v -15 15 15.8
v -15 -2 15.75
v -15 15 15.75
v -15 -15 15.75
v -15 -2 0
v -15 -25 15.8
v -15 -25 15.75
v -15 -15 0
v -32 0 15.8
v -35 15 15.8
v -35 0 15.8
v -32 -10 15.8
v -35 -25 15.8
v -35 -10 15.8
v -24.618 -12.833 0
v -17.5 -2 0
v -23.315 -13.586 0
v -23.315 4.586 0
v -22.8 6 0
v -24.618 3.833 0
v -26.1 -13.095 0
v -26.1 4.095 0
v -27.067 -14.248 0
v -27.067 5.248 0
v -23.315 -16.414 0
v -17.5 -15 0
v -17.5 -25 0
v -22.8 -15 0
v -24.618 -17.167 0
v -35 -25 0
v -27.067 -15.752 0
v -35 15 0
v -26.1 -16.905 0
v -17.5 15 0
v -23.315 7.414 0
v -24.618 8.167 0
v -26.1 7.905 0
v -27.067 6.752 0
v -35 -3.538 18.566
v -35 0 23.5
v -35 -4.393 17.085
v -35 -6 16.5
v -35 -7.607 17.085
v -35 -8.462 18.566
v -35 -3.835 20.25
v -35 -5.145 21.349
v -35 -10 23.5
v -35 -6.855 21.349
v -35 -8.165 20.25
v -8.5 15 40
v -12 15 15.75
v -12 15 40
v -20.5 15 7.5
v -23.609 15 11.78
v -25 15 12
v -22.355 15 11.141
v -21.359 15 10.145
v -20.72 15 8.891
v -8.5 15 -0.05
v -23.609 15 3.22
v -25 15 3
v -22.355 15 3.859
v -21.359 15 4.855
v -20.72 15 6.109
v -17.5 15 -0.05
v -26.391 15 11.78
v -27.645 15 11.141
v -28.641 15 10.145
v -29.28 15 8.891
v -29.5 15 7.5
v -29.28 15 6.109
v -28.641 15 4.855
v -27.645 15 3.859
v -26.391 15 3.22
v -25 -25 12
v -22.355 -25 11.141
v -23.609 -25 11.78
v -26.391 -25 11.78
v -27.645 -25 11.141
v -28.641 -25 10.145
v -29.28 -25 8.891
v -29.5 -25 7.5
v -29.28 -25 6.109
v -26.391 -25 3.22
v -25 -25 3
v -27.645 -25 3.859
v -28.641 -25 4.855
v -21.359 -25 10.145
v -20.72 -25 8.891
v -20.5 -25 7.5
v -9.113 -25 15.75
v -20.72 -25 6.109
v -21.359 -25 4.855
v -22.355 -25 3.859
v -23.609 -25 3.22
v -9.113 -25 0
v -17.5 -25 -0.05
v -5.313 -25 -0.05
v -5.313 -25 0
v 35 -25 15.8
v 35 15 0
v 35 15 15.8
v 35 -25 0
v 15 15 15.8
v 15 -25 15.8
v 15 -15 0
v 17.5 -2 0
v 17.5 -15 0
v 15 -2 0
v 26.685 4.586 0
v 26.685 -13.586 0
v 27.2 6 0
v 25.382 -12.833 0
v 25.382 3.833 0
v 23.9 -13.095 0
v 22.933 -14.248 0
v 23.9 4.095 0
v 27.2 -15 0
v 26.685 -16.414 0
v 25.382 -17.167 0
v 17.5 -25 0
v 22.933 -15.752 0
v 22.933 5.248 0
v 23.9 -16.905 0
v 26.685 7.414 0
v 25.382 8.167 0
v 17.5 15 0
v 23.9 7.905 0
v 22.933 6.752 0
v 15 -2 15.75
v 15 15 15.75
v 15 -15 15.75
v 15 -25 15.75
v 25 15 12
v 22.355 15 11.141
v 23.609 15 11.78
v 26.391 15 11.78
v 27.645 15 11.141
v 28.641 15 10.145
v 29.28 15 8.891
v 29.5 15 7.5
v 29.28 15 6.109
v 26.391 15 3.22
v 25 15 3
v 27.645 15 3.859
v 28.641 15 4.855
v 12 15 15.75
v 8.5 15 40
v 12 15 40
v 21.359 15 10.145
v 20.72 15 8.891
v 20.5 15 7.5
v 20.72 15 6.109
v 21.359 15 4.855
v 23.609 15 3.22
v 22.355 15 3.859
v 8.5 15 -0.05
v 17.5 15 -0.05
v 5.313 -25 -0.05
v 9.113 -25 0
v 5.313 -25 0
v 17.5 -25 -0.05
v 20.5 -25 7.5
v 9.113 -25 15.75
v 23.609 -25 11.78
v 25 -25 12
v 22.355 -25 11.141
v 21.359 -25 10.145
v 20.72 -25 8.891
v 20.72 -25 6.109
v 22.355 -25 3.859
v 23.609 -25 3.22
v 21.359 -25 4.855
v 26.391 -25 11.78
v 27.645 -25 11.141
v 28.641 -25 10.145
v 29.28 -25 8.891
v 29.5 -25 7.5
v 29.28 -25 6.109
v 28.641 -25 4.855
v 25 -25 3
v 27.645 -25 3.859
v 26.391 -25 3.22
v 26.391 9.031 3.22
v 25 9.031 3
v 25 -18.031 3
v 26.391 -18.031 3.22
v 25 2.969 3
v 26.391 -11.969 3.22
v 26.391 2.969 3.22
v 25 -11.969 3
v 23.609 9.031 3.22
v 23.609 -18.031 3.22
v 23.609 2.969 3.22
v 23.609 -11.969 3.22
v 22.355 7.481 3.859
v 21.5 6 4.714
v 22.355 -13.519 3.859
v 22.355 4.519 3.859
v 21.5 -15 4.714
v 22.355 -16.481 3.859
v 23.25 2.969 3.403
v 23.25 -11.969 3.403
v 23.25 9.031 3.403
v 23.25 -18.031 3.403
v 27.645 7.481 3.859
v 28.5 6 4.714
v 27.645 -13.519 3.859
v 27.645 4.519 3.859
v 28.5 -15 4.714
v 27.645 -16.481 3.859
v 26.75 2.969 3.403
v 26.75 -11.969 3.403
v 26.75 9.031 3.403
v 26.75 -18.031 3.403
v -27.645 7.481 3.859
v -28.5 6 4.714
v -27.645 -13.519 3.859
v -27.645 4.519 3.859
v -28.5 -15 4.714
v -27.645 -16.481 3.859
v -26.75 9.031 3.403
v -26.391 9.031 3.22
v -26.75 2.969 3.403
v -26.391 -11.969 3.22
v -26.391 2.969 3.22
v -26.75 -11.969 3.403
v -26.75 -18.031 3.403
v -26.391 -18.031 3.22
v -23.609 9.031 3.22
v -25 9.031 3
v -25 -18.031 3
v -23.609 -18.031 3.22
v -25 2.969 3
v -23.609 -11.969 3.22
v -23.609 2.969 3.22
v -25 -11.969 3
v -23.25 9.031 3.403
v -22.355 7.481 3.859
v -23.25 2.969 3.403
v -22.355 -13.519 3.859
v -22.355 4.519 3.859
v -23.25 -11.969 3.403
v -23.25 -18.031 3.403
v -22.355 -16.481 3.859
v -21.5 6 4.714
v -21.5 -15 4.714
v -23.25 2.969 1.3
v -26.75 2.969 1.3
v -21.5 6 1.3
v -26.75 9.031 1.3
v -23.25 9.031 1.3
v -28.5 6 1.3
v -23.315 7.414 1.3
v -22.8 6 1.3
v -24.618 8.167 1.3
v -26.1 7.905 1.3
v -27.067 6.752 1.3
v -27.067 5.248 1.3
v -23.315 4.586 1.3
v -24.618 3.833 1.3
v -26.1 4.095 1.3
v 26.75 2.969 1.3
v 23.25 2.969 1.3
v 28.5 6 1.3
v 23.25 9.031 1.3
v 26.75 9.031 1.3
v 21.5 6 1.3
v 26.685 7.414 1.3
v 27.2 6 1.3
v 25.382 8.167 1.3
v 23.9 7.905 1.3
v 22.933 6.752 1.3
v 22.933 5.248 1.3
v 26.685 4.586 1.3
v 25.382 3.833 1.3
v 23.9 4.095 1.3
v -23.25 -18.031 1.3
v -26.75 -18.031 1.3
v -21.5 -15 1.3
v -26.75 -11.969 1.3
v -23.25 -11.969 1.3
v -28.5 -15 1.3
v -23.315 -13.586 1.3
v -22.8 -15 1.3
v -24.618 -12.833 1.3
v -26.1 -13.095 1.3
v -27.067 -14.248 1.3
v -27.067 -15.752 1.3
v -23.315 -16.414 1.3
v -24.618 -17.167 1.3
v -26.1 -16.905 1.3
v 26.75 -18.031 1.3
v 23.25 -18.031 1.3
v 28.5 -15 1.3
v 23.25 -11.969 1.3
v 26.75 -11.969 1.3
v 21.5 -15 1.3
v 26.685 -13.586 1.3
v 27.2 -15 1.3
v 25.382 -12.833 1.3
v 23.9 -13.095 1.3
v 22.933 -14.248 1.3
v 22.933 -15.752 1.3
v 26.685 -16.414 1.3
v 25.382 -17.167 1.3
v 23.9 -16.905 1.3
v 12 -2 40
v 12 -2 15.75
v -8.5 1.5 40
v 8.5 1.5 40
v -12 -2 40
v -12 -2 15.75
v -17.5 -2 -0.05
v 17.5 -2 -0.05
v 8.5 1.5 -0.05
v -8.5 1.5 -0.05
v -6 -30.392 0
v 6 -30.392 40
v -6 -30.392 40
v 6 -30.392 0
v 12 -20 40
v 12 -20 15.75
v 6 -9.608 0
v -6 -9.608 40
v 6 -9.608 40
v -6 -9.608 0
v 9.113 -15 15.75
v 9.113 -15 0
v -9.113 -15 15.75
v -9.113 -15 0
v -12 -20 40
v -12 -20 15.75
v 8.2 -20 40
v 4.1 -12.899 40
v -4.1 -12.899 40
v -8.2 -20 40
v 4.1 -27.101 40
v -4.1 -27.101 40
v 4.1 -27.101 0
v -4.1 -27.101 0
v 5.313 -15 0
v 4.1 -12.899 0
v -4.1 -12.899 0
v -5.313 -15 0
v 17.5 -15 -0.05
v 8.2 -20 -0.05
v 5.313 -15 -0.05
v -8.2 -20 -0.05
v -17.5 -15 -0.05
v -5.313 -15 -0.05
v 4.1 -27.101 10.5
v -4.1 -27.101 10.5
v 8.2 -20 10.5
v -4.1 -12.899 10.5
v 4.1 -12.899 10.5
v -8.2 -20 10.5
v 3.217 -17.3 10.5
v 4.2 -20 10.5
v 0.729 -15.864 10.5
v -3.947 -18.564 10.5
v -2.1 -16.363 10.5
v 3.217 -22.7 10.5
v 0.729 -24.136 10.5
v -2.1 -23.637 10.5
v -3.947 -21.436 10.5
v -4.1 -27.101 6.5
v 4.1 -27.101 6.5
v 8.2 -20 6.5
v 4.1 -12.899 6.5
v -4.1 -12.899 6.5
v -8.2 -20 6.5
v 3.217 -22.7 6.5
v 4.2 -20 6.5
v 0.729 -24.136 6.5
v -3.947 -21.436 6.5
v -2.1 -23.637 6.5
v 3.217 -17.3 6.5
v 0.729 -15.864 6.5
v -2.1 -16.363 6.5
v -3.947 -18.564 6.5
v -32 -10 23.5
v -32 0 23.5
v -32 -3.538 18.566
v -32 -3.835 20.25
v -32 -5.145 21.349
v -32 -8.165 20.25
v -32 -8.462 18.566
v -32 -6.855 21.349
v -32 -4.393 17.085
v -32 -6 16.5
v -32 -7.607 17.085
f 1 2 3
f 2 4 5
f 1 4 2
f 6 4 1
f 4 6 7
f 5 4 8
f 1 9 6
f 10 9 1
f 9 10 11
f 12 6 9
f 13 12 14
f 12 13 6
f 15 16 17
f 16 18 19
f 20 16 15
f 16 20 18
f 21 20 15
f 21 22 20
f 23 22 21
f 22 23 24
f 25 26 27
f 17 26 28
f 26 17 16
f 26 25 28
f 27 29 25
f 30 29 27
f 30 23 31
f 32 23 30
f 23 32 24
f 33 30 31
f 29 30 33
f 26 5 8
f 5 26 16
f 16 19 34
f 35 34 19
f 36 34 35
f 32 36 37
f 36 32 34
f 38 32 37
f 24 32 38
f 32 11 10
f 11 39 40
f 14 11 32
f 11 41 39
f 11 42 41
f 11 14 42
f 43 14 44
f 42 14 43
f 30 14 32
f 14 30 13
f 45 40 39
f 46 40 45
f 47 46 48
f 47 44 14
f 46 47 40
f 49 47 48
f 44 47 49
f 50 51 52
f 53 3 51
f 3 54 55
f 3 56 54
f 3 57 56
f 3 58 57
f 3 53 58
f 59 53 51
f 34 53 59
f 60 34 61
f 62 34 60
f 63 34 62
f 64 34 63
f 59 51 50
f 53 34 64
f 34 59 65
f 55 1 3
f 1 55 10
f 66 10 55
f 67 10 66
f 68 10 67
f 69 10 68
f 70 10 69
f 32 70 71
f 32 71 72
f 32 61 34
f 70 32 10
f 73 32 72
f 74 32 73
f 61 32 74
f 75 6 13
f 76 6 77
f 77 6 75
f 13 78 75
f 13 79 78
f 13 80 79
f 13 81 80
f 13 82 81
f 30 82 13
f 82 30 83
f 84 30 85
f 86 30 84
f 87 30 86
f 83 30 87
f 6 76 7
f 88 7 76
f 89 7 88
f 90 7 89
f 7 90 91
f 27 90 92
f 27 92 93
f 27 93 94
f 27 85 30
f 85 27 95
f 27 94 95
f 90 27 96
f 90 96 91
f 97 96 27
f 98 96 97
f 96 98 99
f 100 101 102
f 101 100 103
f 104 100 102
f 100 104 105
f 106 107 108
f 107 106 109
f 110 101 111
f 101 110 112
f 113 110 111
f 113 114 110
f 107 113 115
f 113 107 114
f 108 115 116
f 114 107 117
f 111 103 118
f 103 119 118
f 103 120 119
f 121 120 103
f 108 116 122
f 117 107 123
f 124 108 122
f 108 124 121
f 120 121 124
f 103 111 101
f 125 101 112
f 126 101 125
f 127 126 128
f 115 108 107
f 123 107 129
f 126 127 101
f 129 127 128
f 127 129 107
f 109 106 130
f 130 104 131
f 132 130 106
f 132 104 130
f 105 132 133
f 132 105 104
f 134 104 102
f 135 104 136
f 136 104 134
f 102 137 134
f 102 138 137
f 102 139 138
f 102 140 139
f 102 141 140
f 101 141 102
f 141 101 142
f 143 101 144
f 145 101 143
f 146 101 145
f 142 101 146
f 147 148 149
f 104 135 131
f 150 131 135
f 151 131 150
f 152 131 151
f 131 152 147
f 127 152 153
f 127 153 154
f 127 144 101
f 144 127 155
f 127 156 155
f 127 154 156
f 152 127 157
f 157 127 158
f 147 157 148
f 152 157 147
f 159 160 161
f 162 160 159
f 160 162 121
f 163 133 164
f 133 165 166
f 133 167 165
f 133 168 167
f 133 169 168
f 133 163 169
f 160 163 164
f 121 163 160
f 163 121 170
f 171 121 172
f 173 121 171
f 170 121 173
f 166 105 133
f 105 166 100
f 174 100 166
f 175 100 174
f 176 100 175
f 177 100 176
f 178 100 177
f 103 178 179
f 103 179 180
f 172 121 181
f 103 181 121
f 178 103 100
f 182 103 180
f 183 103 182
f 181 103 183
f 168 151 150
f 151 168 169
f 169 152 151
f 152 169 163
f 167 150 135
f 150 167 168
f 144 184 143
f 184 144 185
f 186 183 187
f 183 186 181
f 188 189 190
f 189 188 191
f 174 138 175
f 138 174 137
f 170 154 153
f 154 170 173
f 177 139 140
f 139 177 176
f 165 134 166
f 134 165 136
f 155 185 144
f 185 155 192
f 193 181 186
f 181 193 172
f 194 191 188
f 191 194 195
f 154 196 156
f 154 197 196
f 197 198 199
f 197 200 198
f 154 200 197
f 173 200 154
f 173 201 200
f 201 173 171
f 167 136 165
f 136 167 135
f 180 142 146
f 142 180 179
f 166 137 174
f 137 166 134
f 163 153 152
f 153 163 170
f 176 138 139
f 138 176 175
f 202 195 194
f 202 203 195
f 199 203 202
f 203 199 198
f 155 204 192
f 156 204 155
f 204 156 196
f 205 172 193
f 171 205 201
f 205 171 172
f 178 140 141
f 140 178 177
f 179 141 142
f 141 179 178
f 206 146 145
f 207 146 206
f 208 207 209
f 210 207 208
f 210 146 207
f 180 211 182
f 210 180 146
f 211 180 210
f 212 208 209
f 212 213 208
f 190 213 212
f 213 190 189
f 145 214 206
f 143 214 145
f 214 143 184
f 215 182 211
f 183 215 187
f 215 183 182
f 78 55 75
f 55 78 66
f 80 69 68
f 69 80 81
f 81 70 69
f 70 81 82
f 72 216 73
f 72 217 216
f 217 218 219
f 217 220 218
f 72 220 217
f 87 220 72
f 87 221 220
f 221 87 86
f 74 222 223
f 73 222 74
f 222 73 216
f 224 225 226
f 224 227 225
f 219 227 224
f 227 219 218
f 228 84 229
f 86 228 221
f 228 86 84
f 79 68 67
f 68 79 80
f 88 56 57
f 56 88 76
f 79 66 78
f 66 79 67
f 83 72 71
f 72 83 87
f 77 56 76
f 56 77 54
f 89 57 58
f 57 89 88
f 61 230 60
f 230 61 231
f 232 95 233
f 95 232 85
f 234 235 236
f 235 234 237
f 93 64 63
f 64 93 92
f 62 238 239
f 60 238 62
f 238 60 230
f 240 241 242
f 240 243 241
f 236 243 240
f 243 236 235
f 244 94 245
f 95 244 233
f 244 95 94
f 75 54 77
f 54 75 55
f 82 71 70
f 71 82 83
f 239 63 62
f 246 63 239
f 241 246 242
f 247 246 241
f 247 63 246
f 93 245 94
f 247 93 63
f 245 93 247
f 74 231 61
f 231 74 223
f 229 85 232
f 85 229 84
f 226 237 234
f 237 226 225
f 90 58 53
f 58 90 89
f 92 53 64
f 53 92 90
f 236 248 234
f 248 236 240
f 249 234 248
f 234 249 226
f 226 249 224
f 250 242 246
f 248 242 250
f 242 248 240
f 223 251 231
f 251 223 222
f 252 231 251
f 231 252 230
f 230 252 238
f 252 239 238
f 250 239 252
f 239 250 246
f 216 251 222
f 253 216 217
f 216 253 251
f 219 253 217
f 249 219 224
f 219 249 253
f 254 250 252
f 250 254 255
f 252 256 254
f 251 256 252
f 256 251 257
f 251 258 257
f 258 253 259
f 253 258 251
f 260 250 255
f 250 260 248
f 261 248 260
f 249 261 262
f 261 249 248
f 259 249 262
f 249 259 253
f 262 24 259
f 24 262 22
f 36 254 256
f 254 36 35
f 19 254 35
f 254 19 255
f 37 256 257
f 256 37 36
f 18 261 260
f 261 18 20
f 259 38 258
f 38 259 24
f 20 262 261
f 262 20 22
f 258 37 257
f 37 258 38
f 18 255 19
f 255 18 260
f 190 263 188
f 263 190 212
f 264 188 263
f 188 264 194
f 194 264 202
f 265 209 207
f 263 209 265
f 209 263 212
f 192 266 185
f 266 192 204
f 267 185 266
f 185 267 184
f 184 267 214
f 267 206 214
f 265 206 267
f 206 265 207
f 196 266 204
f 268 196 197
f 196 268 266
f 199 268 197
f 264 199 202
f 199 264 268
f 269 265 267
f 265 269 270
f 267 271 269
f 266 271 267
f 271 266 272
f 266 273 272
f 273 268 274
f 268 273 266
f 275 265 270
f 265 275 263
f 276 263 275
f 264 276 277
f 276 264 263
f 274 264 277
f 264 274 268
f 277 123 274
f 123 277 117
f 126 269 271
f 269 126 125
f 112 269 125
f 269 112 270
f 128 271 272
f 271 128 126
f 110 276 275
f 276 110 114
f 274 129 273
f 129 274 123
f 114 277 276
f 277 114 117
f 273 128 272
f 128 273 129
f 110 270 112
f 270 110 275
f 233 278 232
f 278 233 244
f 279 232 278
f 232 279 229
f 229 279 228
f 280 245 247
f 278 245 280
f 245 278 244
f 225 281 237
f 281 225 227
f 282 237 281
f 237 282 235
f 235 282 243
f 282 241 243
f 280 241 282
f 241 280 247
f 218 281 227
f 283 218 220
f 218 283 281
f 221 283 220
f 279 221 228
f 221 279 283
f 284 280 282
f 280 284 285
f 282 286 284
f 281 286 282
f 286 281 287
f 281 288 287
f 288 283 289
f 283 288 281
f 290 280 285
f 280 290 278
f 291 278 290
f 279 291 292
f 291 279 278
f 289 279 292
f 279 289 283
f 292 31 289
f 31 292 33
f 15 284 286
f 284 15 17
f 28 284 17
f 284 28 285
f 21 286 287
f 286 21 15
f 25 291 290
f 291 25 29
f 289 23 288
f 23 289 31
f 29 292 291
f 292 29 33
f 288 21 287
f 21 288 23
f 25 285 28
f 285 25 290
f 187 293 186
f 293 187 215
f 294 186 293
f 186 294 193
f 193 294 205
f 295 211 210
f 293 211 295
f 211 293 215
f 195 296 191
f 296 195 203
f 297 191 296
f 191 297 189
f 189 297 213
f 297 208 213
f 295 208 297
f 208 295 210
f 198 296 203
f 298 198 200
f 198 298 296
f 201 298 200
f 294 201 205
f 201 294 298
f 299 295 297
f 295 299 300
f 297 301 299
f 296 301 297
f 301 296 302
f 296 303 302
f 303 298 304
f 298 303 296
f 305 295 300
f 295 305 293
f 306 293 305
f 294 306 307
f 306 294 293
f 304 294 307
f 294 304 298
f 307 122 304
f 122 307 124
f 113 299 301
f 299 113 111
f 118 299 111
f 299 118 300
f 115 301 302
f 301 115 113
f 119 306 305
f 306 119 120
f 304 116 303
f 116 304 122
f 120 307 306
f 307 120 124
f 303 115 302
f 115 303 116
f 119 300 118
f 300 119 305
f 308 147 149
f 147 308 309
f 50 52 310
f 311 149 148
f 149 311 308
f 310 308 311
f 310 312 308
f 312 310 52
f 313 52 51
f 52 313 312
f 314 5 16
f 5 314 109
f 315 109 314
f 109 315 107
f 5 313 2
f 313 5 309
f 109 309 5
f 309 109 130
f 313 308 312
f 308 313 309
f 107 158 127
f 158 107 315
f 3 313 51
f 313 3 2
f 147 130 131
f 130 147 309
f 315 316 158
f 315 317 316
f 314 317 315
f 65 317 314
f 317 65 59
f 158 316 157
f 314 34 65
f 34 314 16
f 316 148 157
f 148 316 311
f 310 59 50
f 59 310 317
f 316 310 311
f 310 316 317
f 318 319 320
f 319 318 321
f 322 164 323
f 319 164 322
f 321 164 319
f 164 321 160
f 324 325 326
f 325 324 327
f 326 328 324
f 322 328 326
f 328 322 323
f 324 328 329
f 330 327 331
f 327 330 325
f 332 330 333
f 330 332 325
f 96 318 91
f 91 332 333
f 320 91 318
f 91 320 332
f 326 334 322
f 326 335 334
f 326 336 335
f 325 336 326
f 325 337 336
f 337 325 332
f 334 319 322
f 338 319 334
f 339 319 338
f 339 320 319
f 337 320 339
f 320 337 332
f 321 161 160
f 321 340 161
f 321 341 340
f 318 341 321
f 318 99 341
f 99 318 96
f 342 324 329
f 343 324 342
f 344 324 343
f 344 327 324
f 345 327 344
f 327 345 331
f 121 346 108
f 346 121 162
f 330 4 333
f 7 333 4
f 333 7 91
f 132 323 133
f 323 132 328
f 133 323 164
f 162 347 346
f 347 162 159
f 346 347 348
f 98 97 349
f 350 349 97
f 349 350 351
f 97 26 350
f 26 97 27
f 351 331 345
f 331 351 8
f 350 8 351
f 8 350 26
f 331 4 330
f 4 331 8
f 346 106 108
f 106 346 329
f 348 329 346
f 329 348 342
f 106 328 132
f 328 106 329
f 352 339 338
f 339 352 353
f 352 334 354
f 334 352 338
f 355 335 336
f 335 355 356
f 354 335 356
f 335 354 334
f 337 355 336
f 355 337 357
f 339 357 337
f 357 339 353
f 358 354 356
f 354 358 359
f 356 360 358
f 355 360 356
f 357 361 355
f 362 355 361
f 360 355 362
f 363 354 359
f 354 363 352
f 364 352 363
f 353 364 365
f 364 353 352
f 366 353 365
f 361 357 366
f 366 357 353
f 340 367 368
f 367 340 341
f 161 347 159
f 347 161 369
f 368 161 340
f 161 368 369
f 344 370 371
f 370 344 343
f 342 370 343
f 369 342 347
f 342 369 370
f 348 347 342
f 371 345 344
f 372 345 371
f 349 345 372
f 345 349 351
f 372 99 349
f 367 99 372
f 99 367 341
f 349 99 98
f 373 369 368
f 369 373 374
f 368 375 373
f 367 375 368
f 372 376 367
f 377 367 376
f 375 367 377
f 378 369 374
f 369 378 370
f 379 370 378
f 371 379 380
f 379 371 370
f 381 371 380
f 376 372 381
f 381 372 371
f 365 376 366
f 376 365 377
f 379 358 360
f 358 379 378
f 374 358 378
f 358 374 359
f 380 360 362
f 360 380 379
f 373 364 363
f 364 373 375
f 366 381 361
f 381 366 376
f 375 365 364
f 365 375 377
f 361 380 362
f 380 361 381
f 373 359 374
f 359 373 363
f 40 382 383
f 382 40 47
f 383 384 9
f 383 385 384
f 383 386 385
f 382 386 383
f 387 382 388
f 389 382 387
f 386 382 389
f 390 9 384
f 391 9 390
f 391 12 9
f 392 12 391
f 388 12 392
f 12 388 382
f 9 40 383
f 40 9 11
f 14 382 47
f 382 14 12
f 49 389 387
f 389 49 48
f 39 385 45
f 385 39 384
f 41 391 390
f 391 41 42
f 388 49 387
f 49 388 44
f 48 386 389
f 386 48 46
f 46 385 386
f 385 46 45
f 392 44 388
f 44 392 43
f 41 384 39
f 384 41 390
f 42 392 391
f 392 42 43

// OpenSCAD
// file: common.scad
// This file contains common components shared between parts.
// Not only does abstracting like this simplify the parts,
// But it ensures the inter-part rods line up.
// (C) Christopher Olah, 2010. Released under the GPL.
// Many of the components based off of the original designs.

module motor() {
	//This is (essentially) what ever was being used in z-motor-mount orriginaly. 
	// Should be rewriten for NEMA compliance, to match the NEMA_version var.
	// Motor sits in this
	cube(size = [45,43,10], center = true);
	// And goes through this
	translate([0,0,-15]) cylinder(h = 20, r=15);
	//And the screws go through here
	for (y=[-1,1]) for (x=[-1,1]) translate([15*x,15*y,-5]) cube(size = [8,3.2,15], center = true);
}


module diagonal_rod(grip = true) {
	if (grip) for (y=[-1,1]) translate([0,39*y,-40]) rotate([30*y,0,0]) cylinder (h=100,r=4.0);
	if (!grip) for (y=[-1,1]) translate([0,39*y,-40]) rotate([30*y,0,0]) cylinder (h=100,r=4.2);
}

module diagonal_rod_cube (slide = 0, size = [16,16,10]) {
	for (y=[-1,1]) translate([0,39*y,-40]) rotate([30*y,0,0]) translate([0,0,50+slide]) cube(size=size,center=true);
}

module vertical_rods() {
	translate([30,0,-25]) cylinder(h = 80, r=4.0);
	translate([0,0,-25]) cylinder(h = 80, r=4.3);
}


module x_axis_rods() {
	translate([-25, 0, 0]) rotate([90,0,0]) {
		cylinder(h = 120, r=4.5, $fn=20, center=true);
		if (tear_shape) translate([0, 2.60, 0]) cylinder(h = 120, r=3.65, $fn=6, center=true);
	}
	translate([25, 0, 0]) rotate([90,0,0]) {
		cylinder(h = 120, r=4.5, $fn=20, center=true);
		if (tear_shape) translate([0, 2.60, 0]) cylinder(h = 120, r=3.65, $fn=6, center=true);
	}
	if (!x_belt) translate([35, 0, 30]) rotate([90,0,0]) {
		cylinder(h = 120, r=4.5, $fn=20, center=true);
		if (tear_shape) translate([0, 2.60, 0]) cylinder(h = 120, r=3.65, $fn=6, center=true);
	}
}
// file: configuration.scad
// PRUSA Mendel  
// Configuration file
// GNU GPL v2
// Josef Průša
// josefprusa@me.com
// prusadjs.cz
// http://www.reprap.org/wiki/Prusa_Mendel
// http://github.com/prusajr/PrusaMendel

//include <lib/mcad/motors.scad>

// M8 rod diameter
m8_diameter = 8.4;

// M8 nut diameter diameter
// Used for $fn nut trick -> cylinder(h = 5, r=4.5, $fn=6, center=true);
m8_nut_diameter = 16.4;

// M4 rod/screw diameter
m4_diameter = 5;

// M4 nut diameter diameter
// Used for $fn nut trick -> cylinder(h = 5, r=4.5, $fn=6, center=true);
m4_nut_diameter = 9;

// M3 rod/screw diameter
m3_diameter = 4.4;

// M3 nut diameter diameter
// Used for $fn nut trick -> cylinder(h = 5, r=4.5, $fn=6, center=true);
m3_nut_diameter = 7;

// Bushing holders diameter
bushing_diameter = 11;

x_belt = true; //use belt or threaded rod for x-axis movement
               //threaded rod is currently broken. Do not use it.
               //Leave this true or be prepared to do lots of drilling!
               //Also, x-carriage doesn't support this option so you'll
               //have come up with a hack to make it work if you use this
               //option.

two_top_rods = true; //Use two top rods or one?
                      //No repraps have been built with one top, so use
                      //this design at your own risk!


tear_shape = false; //Use tear shaped holes for rods? not compatable with tight_grip = true

tight_grip = true; // Use tight holes where possible so that parts will self tap when 
                   // threaded rod is drilled in. Reduces need for nuts.
                   // tight_grip = false not compatable with two_top_rods = false

//NEMA_version //Variable not yet implemented.
// main file
// PRUSA Mendel  
// X-end with idler mount
// GNU GPL v2
// Josef Průša
// josefprusa@me.com
// prusadjs.cz
// http://www.reprap.org/wiki/Prusa_Mendel
// http://github.com/prusajr/PrusaMendel

include <configuration.scad>
include <common.scad>

translate(v = [0,35,24.5]) {
	union() {
		difference() {
			union() {
				translate(v = [-25, -40, -16.6])
					cube(size = [20,40,15.8], center = true);
				translate(v = [25, -40, -16.6])
					cube(size = [20,40,15.8], center = true);
			}

			//nut traps
			translate(v = [-25, -29, -19.7])
				cylinder(h = 7, r=m3_nut_diameter/2, $fn=6, center=true);
			translate(v = [-25, -29, -20])
				cylinder(h = 10, r=m3_diameter/2, $fn=9, center=true);
			translate(v = [25, -29, -19.7])
				cylinder(h = 7, r=m3_nut_diameter/2, $fn=6, center=true);
			translate(v = [25, -29, -20])
				cylinder(h = 10, r=m3_diameter/2, $fn=9, center=true);

			translate(v = [-25, -50, -19.7])
				cylinder(h = 7, r=m3_nut_diameter/2, $fn=6, center=true);
			translate(v = [-25, -50, -20])
				cylinder(h = 10, r=m3_diameter/2, $fn=9, center=true);
			translate(v = [25, -50, -19.7])
				cylinder(h = 7, r=m3_nut_diameter/2, $fn=6, center=true);
			translate(v = [25, -50, -20])
				cylinder(h = 10, r=m3_diameter/2, $fn=9, center=true);

			//holes for axis
			translate ([0,-75,-17]) rotate ([0,0,180]) x_axis_rods();

		}

		//slider
		translate(v = [0, -25, 15])
			difference() {
				union() {
					translate(v = [0, -3.5, -19.5])
						cube(size = [24,17,40], center = true);
					translate(v = [0, -3.5, -31.65])
						cube(size = [35,17,15.8], center = true);
				}
				translate(v = [0, -0, -17])
					cube(size = [17,17,60], center = true);
			}

		//nut trap
		translate(v = [0, -55, 15]) {
			difference() {
				union() {
					translate(v = [0, -0, -19.5])
						cylinder(h = 40, r=12, $fn=6, center=true);
					translate(v = [0, 0, -31.65])
						cube(size = [35,10,15.8], center = true);
				}
				translate(v = [0, 0, 16])
					cylinder(h = 90, r=m8_nut_diameter/2, $fn=6, center=true);
				translate(v = [0, 0, -78])
					cylinder(h = 90, r=m8_nut_diameter/2, $fn=6, center=true);
				translate(v = [0, 0, 0])
					cylinder(h = 100, r=m8_diameter/2, $fn=9, center=true);
			}
		}

		//idler wheel connector
		if (x_belt) {
			mirror() {
				translate(v = [0, -35, -12]) {
					difference() {
						translate(v = [33.5, -5, 6])
							cube(size = [3,10,10], center = true);
						translate(v = [32.5, -6, 6.5])
							rotate(a=[0,90,0])
								cylinder(h = 90, r=m4_diameter/2, $fn=9, center=true);
					}
				}
			}
		}else {
			translate([-65,0,-12]) {
				difference(){
					union(){
						translate([32, -29, 25]) cube([45,15,51], center = true);
						translate([20, -29, -2.5]) cube([21,15,20], center = true);
					}
					translate([30,-23,25]) rotate([90,0,0]) cylinder(h = 20, r=12);
					translate([30,-15,25]) rotate([90,0,0]) cylinder(h = 10, r=8);
				}
			}
		}
	}
}
